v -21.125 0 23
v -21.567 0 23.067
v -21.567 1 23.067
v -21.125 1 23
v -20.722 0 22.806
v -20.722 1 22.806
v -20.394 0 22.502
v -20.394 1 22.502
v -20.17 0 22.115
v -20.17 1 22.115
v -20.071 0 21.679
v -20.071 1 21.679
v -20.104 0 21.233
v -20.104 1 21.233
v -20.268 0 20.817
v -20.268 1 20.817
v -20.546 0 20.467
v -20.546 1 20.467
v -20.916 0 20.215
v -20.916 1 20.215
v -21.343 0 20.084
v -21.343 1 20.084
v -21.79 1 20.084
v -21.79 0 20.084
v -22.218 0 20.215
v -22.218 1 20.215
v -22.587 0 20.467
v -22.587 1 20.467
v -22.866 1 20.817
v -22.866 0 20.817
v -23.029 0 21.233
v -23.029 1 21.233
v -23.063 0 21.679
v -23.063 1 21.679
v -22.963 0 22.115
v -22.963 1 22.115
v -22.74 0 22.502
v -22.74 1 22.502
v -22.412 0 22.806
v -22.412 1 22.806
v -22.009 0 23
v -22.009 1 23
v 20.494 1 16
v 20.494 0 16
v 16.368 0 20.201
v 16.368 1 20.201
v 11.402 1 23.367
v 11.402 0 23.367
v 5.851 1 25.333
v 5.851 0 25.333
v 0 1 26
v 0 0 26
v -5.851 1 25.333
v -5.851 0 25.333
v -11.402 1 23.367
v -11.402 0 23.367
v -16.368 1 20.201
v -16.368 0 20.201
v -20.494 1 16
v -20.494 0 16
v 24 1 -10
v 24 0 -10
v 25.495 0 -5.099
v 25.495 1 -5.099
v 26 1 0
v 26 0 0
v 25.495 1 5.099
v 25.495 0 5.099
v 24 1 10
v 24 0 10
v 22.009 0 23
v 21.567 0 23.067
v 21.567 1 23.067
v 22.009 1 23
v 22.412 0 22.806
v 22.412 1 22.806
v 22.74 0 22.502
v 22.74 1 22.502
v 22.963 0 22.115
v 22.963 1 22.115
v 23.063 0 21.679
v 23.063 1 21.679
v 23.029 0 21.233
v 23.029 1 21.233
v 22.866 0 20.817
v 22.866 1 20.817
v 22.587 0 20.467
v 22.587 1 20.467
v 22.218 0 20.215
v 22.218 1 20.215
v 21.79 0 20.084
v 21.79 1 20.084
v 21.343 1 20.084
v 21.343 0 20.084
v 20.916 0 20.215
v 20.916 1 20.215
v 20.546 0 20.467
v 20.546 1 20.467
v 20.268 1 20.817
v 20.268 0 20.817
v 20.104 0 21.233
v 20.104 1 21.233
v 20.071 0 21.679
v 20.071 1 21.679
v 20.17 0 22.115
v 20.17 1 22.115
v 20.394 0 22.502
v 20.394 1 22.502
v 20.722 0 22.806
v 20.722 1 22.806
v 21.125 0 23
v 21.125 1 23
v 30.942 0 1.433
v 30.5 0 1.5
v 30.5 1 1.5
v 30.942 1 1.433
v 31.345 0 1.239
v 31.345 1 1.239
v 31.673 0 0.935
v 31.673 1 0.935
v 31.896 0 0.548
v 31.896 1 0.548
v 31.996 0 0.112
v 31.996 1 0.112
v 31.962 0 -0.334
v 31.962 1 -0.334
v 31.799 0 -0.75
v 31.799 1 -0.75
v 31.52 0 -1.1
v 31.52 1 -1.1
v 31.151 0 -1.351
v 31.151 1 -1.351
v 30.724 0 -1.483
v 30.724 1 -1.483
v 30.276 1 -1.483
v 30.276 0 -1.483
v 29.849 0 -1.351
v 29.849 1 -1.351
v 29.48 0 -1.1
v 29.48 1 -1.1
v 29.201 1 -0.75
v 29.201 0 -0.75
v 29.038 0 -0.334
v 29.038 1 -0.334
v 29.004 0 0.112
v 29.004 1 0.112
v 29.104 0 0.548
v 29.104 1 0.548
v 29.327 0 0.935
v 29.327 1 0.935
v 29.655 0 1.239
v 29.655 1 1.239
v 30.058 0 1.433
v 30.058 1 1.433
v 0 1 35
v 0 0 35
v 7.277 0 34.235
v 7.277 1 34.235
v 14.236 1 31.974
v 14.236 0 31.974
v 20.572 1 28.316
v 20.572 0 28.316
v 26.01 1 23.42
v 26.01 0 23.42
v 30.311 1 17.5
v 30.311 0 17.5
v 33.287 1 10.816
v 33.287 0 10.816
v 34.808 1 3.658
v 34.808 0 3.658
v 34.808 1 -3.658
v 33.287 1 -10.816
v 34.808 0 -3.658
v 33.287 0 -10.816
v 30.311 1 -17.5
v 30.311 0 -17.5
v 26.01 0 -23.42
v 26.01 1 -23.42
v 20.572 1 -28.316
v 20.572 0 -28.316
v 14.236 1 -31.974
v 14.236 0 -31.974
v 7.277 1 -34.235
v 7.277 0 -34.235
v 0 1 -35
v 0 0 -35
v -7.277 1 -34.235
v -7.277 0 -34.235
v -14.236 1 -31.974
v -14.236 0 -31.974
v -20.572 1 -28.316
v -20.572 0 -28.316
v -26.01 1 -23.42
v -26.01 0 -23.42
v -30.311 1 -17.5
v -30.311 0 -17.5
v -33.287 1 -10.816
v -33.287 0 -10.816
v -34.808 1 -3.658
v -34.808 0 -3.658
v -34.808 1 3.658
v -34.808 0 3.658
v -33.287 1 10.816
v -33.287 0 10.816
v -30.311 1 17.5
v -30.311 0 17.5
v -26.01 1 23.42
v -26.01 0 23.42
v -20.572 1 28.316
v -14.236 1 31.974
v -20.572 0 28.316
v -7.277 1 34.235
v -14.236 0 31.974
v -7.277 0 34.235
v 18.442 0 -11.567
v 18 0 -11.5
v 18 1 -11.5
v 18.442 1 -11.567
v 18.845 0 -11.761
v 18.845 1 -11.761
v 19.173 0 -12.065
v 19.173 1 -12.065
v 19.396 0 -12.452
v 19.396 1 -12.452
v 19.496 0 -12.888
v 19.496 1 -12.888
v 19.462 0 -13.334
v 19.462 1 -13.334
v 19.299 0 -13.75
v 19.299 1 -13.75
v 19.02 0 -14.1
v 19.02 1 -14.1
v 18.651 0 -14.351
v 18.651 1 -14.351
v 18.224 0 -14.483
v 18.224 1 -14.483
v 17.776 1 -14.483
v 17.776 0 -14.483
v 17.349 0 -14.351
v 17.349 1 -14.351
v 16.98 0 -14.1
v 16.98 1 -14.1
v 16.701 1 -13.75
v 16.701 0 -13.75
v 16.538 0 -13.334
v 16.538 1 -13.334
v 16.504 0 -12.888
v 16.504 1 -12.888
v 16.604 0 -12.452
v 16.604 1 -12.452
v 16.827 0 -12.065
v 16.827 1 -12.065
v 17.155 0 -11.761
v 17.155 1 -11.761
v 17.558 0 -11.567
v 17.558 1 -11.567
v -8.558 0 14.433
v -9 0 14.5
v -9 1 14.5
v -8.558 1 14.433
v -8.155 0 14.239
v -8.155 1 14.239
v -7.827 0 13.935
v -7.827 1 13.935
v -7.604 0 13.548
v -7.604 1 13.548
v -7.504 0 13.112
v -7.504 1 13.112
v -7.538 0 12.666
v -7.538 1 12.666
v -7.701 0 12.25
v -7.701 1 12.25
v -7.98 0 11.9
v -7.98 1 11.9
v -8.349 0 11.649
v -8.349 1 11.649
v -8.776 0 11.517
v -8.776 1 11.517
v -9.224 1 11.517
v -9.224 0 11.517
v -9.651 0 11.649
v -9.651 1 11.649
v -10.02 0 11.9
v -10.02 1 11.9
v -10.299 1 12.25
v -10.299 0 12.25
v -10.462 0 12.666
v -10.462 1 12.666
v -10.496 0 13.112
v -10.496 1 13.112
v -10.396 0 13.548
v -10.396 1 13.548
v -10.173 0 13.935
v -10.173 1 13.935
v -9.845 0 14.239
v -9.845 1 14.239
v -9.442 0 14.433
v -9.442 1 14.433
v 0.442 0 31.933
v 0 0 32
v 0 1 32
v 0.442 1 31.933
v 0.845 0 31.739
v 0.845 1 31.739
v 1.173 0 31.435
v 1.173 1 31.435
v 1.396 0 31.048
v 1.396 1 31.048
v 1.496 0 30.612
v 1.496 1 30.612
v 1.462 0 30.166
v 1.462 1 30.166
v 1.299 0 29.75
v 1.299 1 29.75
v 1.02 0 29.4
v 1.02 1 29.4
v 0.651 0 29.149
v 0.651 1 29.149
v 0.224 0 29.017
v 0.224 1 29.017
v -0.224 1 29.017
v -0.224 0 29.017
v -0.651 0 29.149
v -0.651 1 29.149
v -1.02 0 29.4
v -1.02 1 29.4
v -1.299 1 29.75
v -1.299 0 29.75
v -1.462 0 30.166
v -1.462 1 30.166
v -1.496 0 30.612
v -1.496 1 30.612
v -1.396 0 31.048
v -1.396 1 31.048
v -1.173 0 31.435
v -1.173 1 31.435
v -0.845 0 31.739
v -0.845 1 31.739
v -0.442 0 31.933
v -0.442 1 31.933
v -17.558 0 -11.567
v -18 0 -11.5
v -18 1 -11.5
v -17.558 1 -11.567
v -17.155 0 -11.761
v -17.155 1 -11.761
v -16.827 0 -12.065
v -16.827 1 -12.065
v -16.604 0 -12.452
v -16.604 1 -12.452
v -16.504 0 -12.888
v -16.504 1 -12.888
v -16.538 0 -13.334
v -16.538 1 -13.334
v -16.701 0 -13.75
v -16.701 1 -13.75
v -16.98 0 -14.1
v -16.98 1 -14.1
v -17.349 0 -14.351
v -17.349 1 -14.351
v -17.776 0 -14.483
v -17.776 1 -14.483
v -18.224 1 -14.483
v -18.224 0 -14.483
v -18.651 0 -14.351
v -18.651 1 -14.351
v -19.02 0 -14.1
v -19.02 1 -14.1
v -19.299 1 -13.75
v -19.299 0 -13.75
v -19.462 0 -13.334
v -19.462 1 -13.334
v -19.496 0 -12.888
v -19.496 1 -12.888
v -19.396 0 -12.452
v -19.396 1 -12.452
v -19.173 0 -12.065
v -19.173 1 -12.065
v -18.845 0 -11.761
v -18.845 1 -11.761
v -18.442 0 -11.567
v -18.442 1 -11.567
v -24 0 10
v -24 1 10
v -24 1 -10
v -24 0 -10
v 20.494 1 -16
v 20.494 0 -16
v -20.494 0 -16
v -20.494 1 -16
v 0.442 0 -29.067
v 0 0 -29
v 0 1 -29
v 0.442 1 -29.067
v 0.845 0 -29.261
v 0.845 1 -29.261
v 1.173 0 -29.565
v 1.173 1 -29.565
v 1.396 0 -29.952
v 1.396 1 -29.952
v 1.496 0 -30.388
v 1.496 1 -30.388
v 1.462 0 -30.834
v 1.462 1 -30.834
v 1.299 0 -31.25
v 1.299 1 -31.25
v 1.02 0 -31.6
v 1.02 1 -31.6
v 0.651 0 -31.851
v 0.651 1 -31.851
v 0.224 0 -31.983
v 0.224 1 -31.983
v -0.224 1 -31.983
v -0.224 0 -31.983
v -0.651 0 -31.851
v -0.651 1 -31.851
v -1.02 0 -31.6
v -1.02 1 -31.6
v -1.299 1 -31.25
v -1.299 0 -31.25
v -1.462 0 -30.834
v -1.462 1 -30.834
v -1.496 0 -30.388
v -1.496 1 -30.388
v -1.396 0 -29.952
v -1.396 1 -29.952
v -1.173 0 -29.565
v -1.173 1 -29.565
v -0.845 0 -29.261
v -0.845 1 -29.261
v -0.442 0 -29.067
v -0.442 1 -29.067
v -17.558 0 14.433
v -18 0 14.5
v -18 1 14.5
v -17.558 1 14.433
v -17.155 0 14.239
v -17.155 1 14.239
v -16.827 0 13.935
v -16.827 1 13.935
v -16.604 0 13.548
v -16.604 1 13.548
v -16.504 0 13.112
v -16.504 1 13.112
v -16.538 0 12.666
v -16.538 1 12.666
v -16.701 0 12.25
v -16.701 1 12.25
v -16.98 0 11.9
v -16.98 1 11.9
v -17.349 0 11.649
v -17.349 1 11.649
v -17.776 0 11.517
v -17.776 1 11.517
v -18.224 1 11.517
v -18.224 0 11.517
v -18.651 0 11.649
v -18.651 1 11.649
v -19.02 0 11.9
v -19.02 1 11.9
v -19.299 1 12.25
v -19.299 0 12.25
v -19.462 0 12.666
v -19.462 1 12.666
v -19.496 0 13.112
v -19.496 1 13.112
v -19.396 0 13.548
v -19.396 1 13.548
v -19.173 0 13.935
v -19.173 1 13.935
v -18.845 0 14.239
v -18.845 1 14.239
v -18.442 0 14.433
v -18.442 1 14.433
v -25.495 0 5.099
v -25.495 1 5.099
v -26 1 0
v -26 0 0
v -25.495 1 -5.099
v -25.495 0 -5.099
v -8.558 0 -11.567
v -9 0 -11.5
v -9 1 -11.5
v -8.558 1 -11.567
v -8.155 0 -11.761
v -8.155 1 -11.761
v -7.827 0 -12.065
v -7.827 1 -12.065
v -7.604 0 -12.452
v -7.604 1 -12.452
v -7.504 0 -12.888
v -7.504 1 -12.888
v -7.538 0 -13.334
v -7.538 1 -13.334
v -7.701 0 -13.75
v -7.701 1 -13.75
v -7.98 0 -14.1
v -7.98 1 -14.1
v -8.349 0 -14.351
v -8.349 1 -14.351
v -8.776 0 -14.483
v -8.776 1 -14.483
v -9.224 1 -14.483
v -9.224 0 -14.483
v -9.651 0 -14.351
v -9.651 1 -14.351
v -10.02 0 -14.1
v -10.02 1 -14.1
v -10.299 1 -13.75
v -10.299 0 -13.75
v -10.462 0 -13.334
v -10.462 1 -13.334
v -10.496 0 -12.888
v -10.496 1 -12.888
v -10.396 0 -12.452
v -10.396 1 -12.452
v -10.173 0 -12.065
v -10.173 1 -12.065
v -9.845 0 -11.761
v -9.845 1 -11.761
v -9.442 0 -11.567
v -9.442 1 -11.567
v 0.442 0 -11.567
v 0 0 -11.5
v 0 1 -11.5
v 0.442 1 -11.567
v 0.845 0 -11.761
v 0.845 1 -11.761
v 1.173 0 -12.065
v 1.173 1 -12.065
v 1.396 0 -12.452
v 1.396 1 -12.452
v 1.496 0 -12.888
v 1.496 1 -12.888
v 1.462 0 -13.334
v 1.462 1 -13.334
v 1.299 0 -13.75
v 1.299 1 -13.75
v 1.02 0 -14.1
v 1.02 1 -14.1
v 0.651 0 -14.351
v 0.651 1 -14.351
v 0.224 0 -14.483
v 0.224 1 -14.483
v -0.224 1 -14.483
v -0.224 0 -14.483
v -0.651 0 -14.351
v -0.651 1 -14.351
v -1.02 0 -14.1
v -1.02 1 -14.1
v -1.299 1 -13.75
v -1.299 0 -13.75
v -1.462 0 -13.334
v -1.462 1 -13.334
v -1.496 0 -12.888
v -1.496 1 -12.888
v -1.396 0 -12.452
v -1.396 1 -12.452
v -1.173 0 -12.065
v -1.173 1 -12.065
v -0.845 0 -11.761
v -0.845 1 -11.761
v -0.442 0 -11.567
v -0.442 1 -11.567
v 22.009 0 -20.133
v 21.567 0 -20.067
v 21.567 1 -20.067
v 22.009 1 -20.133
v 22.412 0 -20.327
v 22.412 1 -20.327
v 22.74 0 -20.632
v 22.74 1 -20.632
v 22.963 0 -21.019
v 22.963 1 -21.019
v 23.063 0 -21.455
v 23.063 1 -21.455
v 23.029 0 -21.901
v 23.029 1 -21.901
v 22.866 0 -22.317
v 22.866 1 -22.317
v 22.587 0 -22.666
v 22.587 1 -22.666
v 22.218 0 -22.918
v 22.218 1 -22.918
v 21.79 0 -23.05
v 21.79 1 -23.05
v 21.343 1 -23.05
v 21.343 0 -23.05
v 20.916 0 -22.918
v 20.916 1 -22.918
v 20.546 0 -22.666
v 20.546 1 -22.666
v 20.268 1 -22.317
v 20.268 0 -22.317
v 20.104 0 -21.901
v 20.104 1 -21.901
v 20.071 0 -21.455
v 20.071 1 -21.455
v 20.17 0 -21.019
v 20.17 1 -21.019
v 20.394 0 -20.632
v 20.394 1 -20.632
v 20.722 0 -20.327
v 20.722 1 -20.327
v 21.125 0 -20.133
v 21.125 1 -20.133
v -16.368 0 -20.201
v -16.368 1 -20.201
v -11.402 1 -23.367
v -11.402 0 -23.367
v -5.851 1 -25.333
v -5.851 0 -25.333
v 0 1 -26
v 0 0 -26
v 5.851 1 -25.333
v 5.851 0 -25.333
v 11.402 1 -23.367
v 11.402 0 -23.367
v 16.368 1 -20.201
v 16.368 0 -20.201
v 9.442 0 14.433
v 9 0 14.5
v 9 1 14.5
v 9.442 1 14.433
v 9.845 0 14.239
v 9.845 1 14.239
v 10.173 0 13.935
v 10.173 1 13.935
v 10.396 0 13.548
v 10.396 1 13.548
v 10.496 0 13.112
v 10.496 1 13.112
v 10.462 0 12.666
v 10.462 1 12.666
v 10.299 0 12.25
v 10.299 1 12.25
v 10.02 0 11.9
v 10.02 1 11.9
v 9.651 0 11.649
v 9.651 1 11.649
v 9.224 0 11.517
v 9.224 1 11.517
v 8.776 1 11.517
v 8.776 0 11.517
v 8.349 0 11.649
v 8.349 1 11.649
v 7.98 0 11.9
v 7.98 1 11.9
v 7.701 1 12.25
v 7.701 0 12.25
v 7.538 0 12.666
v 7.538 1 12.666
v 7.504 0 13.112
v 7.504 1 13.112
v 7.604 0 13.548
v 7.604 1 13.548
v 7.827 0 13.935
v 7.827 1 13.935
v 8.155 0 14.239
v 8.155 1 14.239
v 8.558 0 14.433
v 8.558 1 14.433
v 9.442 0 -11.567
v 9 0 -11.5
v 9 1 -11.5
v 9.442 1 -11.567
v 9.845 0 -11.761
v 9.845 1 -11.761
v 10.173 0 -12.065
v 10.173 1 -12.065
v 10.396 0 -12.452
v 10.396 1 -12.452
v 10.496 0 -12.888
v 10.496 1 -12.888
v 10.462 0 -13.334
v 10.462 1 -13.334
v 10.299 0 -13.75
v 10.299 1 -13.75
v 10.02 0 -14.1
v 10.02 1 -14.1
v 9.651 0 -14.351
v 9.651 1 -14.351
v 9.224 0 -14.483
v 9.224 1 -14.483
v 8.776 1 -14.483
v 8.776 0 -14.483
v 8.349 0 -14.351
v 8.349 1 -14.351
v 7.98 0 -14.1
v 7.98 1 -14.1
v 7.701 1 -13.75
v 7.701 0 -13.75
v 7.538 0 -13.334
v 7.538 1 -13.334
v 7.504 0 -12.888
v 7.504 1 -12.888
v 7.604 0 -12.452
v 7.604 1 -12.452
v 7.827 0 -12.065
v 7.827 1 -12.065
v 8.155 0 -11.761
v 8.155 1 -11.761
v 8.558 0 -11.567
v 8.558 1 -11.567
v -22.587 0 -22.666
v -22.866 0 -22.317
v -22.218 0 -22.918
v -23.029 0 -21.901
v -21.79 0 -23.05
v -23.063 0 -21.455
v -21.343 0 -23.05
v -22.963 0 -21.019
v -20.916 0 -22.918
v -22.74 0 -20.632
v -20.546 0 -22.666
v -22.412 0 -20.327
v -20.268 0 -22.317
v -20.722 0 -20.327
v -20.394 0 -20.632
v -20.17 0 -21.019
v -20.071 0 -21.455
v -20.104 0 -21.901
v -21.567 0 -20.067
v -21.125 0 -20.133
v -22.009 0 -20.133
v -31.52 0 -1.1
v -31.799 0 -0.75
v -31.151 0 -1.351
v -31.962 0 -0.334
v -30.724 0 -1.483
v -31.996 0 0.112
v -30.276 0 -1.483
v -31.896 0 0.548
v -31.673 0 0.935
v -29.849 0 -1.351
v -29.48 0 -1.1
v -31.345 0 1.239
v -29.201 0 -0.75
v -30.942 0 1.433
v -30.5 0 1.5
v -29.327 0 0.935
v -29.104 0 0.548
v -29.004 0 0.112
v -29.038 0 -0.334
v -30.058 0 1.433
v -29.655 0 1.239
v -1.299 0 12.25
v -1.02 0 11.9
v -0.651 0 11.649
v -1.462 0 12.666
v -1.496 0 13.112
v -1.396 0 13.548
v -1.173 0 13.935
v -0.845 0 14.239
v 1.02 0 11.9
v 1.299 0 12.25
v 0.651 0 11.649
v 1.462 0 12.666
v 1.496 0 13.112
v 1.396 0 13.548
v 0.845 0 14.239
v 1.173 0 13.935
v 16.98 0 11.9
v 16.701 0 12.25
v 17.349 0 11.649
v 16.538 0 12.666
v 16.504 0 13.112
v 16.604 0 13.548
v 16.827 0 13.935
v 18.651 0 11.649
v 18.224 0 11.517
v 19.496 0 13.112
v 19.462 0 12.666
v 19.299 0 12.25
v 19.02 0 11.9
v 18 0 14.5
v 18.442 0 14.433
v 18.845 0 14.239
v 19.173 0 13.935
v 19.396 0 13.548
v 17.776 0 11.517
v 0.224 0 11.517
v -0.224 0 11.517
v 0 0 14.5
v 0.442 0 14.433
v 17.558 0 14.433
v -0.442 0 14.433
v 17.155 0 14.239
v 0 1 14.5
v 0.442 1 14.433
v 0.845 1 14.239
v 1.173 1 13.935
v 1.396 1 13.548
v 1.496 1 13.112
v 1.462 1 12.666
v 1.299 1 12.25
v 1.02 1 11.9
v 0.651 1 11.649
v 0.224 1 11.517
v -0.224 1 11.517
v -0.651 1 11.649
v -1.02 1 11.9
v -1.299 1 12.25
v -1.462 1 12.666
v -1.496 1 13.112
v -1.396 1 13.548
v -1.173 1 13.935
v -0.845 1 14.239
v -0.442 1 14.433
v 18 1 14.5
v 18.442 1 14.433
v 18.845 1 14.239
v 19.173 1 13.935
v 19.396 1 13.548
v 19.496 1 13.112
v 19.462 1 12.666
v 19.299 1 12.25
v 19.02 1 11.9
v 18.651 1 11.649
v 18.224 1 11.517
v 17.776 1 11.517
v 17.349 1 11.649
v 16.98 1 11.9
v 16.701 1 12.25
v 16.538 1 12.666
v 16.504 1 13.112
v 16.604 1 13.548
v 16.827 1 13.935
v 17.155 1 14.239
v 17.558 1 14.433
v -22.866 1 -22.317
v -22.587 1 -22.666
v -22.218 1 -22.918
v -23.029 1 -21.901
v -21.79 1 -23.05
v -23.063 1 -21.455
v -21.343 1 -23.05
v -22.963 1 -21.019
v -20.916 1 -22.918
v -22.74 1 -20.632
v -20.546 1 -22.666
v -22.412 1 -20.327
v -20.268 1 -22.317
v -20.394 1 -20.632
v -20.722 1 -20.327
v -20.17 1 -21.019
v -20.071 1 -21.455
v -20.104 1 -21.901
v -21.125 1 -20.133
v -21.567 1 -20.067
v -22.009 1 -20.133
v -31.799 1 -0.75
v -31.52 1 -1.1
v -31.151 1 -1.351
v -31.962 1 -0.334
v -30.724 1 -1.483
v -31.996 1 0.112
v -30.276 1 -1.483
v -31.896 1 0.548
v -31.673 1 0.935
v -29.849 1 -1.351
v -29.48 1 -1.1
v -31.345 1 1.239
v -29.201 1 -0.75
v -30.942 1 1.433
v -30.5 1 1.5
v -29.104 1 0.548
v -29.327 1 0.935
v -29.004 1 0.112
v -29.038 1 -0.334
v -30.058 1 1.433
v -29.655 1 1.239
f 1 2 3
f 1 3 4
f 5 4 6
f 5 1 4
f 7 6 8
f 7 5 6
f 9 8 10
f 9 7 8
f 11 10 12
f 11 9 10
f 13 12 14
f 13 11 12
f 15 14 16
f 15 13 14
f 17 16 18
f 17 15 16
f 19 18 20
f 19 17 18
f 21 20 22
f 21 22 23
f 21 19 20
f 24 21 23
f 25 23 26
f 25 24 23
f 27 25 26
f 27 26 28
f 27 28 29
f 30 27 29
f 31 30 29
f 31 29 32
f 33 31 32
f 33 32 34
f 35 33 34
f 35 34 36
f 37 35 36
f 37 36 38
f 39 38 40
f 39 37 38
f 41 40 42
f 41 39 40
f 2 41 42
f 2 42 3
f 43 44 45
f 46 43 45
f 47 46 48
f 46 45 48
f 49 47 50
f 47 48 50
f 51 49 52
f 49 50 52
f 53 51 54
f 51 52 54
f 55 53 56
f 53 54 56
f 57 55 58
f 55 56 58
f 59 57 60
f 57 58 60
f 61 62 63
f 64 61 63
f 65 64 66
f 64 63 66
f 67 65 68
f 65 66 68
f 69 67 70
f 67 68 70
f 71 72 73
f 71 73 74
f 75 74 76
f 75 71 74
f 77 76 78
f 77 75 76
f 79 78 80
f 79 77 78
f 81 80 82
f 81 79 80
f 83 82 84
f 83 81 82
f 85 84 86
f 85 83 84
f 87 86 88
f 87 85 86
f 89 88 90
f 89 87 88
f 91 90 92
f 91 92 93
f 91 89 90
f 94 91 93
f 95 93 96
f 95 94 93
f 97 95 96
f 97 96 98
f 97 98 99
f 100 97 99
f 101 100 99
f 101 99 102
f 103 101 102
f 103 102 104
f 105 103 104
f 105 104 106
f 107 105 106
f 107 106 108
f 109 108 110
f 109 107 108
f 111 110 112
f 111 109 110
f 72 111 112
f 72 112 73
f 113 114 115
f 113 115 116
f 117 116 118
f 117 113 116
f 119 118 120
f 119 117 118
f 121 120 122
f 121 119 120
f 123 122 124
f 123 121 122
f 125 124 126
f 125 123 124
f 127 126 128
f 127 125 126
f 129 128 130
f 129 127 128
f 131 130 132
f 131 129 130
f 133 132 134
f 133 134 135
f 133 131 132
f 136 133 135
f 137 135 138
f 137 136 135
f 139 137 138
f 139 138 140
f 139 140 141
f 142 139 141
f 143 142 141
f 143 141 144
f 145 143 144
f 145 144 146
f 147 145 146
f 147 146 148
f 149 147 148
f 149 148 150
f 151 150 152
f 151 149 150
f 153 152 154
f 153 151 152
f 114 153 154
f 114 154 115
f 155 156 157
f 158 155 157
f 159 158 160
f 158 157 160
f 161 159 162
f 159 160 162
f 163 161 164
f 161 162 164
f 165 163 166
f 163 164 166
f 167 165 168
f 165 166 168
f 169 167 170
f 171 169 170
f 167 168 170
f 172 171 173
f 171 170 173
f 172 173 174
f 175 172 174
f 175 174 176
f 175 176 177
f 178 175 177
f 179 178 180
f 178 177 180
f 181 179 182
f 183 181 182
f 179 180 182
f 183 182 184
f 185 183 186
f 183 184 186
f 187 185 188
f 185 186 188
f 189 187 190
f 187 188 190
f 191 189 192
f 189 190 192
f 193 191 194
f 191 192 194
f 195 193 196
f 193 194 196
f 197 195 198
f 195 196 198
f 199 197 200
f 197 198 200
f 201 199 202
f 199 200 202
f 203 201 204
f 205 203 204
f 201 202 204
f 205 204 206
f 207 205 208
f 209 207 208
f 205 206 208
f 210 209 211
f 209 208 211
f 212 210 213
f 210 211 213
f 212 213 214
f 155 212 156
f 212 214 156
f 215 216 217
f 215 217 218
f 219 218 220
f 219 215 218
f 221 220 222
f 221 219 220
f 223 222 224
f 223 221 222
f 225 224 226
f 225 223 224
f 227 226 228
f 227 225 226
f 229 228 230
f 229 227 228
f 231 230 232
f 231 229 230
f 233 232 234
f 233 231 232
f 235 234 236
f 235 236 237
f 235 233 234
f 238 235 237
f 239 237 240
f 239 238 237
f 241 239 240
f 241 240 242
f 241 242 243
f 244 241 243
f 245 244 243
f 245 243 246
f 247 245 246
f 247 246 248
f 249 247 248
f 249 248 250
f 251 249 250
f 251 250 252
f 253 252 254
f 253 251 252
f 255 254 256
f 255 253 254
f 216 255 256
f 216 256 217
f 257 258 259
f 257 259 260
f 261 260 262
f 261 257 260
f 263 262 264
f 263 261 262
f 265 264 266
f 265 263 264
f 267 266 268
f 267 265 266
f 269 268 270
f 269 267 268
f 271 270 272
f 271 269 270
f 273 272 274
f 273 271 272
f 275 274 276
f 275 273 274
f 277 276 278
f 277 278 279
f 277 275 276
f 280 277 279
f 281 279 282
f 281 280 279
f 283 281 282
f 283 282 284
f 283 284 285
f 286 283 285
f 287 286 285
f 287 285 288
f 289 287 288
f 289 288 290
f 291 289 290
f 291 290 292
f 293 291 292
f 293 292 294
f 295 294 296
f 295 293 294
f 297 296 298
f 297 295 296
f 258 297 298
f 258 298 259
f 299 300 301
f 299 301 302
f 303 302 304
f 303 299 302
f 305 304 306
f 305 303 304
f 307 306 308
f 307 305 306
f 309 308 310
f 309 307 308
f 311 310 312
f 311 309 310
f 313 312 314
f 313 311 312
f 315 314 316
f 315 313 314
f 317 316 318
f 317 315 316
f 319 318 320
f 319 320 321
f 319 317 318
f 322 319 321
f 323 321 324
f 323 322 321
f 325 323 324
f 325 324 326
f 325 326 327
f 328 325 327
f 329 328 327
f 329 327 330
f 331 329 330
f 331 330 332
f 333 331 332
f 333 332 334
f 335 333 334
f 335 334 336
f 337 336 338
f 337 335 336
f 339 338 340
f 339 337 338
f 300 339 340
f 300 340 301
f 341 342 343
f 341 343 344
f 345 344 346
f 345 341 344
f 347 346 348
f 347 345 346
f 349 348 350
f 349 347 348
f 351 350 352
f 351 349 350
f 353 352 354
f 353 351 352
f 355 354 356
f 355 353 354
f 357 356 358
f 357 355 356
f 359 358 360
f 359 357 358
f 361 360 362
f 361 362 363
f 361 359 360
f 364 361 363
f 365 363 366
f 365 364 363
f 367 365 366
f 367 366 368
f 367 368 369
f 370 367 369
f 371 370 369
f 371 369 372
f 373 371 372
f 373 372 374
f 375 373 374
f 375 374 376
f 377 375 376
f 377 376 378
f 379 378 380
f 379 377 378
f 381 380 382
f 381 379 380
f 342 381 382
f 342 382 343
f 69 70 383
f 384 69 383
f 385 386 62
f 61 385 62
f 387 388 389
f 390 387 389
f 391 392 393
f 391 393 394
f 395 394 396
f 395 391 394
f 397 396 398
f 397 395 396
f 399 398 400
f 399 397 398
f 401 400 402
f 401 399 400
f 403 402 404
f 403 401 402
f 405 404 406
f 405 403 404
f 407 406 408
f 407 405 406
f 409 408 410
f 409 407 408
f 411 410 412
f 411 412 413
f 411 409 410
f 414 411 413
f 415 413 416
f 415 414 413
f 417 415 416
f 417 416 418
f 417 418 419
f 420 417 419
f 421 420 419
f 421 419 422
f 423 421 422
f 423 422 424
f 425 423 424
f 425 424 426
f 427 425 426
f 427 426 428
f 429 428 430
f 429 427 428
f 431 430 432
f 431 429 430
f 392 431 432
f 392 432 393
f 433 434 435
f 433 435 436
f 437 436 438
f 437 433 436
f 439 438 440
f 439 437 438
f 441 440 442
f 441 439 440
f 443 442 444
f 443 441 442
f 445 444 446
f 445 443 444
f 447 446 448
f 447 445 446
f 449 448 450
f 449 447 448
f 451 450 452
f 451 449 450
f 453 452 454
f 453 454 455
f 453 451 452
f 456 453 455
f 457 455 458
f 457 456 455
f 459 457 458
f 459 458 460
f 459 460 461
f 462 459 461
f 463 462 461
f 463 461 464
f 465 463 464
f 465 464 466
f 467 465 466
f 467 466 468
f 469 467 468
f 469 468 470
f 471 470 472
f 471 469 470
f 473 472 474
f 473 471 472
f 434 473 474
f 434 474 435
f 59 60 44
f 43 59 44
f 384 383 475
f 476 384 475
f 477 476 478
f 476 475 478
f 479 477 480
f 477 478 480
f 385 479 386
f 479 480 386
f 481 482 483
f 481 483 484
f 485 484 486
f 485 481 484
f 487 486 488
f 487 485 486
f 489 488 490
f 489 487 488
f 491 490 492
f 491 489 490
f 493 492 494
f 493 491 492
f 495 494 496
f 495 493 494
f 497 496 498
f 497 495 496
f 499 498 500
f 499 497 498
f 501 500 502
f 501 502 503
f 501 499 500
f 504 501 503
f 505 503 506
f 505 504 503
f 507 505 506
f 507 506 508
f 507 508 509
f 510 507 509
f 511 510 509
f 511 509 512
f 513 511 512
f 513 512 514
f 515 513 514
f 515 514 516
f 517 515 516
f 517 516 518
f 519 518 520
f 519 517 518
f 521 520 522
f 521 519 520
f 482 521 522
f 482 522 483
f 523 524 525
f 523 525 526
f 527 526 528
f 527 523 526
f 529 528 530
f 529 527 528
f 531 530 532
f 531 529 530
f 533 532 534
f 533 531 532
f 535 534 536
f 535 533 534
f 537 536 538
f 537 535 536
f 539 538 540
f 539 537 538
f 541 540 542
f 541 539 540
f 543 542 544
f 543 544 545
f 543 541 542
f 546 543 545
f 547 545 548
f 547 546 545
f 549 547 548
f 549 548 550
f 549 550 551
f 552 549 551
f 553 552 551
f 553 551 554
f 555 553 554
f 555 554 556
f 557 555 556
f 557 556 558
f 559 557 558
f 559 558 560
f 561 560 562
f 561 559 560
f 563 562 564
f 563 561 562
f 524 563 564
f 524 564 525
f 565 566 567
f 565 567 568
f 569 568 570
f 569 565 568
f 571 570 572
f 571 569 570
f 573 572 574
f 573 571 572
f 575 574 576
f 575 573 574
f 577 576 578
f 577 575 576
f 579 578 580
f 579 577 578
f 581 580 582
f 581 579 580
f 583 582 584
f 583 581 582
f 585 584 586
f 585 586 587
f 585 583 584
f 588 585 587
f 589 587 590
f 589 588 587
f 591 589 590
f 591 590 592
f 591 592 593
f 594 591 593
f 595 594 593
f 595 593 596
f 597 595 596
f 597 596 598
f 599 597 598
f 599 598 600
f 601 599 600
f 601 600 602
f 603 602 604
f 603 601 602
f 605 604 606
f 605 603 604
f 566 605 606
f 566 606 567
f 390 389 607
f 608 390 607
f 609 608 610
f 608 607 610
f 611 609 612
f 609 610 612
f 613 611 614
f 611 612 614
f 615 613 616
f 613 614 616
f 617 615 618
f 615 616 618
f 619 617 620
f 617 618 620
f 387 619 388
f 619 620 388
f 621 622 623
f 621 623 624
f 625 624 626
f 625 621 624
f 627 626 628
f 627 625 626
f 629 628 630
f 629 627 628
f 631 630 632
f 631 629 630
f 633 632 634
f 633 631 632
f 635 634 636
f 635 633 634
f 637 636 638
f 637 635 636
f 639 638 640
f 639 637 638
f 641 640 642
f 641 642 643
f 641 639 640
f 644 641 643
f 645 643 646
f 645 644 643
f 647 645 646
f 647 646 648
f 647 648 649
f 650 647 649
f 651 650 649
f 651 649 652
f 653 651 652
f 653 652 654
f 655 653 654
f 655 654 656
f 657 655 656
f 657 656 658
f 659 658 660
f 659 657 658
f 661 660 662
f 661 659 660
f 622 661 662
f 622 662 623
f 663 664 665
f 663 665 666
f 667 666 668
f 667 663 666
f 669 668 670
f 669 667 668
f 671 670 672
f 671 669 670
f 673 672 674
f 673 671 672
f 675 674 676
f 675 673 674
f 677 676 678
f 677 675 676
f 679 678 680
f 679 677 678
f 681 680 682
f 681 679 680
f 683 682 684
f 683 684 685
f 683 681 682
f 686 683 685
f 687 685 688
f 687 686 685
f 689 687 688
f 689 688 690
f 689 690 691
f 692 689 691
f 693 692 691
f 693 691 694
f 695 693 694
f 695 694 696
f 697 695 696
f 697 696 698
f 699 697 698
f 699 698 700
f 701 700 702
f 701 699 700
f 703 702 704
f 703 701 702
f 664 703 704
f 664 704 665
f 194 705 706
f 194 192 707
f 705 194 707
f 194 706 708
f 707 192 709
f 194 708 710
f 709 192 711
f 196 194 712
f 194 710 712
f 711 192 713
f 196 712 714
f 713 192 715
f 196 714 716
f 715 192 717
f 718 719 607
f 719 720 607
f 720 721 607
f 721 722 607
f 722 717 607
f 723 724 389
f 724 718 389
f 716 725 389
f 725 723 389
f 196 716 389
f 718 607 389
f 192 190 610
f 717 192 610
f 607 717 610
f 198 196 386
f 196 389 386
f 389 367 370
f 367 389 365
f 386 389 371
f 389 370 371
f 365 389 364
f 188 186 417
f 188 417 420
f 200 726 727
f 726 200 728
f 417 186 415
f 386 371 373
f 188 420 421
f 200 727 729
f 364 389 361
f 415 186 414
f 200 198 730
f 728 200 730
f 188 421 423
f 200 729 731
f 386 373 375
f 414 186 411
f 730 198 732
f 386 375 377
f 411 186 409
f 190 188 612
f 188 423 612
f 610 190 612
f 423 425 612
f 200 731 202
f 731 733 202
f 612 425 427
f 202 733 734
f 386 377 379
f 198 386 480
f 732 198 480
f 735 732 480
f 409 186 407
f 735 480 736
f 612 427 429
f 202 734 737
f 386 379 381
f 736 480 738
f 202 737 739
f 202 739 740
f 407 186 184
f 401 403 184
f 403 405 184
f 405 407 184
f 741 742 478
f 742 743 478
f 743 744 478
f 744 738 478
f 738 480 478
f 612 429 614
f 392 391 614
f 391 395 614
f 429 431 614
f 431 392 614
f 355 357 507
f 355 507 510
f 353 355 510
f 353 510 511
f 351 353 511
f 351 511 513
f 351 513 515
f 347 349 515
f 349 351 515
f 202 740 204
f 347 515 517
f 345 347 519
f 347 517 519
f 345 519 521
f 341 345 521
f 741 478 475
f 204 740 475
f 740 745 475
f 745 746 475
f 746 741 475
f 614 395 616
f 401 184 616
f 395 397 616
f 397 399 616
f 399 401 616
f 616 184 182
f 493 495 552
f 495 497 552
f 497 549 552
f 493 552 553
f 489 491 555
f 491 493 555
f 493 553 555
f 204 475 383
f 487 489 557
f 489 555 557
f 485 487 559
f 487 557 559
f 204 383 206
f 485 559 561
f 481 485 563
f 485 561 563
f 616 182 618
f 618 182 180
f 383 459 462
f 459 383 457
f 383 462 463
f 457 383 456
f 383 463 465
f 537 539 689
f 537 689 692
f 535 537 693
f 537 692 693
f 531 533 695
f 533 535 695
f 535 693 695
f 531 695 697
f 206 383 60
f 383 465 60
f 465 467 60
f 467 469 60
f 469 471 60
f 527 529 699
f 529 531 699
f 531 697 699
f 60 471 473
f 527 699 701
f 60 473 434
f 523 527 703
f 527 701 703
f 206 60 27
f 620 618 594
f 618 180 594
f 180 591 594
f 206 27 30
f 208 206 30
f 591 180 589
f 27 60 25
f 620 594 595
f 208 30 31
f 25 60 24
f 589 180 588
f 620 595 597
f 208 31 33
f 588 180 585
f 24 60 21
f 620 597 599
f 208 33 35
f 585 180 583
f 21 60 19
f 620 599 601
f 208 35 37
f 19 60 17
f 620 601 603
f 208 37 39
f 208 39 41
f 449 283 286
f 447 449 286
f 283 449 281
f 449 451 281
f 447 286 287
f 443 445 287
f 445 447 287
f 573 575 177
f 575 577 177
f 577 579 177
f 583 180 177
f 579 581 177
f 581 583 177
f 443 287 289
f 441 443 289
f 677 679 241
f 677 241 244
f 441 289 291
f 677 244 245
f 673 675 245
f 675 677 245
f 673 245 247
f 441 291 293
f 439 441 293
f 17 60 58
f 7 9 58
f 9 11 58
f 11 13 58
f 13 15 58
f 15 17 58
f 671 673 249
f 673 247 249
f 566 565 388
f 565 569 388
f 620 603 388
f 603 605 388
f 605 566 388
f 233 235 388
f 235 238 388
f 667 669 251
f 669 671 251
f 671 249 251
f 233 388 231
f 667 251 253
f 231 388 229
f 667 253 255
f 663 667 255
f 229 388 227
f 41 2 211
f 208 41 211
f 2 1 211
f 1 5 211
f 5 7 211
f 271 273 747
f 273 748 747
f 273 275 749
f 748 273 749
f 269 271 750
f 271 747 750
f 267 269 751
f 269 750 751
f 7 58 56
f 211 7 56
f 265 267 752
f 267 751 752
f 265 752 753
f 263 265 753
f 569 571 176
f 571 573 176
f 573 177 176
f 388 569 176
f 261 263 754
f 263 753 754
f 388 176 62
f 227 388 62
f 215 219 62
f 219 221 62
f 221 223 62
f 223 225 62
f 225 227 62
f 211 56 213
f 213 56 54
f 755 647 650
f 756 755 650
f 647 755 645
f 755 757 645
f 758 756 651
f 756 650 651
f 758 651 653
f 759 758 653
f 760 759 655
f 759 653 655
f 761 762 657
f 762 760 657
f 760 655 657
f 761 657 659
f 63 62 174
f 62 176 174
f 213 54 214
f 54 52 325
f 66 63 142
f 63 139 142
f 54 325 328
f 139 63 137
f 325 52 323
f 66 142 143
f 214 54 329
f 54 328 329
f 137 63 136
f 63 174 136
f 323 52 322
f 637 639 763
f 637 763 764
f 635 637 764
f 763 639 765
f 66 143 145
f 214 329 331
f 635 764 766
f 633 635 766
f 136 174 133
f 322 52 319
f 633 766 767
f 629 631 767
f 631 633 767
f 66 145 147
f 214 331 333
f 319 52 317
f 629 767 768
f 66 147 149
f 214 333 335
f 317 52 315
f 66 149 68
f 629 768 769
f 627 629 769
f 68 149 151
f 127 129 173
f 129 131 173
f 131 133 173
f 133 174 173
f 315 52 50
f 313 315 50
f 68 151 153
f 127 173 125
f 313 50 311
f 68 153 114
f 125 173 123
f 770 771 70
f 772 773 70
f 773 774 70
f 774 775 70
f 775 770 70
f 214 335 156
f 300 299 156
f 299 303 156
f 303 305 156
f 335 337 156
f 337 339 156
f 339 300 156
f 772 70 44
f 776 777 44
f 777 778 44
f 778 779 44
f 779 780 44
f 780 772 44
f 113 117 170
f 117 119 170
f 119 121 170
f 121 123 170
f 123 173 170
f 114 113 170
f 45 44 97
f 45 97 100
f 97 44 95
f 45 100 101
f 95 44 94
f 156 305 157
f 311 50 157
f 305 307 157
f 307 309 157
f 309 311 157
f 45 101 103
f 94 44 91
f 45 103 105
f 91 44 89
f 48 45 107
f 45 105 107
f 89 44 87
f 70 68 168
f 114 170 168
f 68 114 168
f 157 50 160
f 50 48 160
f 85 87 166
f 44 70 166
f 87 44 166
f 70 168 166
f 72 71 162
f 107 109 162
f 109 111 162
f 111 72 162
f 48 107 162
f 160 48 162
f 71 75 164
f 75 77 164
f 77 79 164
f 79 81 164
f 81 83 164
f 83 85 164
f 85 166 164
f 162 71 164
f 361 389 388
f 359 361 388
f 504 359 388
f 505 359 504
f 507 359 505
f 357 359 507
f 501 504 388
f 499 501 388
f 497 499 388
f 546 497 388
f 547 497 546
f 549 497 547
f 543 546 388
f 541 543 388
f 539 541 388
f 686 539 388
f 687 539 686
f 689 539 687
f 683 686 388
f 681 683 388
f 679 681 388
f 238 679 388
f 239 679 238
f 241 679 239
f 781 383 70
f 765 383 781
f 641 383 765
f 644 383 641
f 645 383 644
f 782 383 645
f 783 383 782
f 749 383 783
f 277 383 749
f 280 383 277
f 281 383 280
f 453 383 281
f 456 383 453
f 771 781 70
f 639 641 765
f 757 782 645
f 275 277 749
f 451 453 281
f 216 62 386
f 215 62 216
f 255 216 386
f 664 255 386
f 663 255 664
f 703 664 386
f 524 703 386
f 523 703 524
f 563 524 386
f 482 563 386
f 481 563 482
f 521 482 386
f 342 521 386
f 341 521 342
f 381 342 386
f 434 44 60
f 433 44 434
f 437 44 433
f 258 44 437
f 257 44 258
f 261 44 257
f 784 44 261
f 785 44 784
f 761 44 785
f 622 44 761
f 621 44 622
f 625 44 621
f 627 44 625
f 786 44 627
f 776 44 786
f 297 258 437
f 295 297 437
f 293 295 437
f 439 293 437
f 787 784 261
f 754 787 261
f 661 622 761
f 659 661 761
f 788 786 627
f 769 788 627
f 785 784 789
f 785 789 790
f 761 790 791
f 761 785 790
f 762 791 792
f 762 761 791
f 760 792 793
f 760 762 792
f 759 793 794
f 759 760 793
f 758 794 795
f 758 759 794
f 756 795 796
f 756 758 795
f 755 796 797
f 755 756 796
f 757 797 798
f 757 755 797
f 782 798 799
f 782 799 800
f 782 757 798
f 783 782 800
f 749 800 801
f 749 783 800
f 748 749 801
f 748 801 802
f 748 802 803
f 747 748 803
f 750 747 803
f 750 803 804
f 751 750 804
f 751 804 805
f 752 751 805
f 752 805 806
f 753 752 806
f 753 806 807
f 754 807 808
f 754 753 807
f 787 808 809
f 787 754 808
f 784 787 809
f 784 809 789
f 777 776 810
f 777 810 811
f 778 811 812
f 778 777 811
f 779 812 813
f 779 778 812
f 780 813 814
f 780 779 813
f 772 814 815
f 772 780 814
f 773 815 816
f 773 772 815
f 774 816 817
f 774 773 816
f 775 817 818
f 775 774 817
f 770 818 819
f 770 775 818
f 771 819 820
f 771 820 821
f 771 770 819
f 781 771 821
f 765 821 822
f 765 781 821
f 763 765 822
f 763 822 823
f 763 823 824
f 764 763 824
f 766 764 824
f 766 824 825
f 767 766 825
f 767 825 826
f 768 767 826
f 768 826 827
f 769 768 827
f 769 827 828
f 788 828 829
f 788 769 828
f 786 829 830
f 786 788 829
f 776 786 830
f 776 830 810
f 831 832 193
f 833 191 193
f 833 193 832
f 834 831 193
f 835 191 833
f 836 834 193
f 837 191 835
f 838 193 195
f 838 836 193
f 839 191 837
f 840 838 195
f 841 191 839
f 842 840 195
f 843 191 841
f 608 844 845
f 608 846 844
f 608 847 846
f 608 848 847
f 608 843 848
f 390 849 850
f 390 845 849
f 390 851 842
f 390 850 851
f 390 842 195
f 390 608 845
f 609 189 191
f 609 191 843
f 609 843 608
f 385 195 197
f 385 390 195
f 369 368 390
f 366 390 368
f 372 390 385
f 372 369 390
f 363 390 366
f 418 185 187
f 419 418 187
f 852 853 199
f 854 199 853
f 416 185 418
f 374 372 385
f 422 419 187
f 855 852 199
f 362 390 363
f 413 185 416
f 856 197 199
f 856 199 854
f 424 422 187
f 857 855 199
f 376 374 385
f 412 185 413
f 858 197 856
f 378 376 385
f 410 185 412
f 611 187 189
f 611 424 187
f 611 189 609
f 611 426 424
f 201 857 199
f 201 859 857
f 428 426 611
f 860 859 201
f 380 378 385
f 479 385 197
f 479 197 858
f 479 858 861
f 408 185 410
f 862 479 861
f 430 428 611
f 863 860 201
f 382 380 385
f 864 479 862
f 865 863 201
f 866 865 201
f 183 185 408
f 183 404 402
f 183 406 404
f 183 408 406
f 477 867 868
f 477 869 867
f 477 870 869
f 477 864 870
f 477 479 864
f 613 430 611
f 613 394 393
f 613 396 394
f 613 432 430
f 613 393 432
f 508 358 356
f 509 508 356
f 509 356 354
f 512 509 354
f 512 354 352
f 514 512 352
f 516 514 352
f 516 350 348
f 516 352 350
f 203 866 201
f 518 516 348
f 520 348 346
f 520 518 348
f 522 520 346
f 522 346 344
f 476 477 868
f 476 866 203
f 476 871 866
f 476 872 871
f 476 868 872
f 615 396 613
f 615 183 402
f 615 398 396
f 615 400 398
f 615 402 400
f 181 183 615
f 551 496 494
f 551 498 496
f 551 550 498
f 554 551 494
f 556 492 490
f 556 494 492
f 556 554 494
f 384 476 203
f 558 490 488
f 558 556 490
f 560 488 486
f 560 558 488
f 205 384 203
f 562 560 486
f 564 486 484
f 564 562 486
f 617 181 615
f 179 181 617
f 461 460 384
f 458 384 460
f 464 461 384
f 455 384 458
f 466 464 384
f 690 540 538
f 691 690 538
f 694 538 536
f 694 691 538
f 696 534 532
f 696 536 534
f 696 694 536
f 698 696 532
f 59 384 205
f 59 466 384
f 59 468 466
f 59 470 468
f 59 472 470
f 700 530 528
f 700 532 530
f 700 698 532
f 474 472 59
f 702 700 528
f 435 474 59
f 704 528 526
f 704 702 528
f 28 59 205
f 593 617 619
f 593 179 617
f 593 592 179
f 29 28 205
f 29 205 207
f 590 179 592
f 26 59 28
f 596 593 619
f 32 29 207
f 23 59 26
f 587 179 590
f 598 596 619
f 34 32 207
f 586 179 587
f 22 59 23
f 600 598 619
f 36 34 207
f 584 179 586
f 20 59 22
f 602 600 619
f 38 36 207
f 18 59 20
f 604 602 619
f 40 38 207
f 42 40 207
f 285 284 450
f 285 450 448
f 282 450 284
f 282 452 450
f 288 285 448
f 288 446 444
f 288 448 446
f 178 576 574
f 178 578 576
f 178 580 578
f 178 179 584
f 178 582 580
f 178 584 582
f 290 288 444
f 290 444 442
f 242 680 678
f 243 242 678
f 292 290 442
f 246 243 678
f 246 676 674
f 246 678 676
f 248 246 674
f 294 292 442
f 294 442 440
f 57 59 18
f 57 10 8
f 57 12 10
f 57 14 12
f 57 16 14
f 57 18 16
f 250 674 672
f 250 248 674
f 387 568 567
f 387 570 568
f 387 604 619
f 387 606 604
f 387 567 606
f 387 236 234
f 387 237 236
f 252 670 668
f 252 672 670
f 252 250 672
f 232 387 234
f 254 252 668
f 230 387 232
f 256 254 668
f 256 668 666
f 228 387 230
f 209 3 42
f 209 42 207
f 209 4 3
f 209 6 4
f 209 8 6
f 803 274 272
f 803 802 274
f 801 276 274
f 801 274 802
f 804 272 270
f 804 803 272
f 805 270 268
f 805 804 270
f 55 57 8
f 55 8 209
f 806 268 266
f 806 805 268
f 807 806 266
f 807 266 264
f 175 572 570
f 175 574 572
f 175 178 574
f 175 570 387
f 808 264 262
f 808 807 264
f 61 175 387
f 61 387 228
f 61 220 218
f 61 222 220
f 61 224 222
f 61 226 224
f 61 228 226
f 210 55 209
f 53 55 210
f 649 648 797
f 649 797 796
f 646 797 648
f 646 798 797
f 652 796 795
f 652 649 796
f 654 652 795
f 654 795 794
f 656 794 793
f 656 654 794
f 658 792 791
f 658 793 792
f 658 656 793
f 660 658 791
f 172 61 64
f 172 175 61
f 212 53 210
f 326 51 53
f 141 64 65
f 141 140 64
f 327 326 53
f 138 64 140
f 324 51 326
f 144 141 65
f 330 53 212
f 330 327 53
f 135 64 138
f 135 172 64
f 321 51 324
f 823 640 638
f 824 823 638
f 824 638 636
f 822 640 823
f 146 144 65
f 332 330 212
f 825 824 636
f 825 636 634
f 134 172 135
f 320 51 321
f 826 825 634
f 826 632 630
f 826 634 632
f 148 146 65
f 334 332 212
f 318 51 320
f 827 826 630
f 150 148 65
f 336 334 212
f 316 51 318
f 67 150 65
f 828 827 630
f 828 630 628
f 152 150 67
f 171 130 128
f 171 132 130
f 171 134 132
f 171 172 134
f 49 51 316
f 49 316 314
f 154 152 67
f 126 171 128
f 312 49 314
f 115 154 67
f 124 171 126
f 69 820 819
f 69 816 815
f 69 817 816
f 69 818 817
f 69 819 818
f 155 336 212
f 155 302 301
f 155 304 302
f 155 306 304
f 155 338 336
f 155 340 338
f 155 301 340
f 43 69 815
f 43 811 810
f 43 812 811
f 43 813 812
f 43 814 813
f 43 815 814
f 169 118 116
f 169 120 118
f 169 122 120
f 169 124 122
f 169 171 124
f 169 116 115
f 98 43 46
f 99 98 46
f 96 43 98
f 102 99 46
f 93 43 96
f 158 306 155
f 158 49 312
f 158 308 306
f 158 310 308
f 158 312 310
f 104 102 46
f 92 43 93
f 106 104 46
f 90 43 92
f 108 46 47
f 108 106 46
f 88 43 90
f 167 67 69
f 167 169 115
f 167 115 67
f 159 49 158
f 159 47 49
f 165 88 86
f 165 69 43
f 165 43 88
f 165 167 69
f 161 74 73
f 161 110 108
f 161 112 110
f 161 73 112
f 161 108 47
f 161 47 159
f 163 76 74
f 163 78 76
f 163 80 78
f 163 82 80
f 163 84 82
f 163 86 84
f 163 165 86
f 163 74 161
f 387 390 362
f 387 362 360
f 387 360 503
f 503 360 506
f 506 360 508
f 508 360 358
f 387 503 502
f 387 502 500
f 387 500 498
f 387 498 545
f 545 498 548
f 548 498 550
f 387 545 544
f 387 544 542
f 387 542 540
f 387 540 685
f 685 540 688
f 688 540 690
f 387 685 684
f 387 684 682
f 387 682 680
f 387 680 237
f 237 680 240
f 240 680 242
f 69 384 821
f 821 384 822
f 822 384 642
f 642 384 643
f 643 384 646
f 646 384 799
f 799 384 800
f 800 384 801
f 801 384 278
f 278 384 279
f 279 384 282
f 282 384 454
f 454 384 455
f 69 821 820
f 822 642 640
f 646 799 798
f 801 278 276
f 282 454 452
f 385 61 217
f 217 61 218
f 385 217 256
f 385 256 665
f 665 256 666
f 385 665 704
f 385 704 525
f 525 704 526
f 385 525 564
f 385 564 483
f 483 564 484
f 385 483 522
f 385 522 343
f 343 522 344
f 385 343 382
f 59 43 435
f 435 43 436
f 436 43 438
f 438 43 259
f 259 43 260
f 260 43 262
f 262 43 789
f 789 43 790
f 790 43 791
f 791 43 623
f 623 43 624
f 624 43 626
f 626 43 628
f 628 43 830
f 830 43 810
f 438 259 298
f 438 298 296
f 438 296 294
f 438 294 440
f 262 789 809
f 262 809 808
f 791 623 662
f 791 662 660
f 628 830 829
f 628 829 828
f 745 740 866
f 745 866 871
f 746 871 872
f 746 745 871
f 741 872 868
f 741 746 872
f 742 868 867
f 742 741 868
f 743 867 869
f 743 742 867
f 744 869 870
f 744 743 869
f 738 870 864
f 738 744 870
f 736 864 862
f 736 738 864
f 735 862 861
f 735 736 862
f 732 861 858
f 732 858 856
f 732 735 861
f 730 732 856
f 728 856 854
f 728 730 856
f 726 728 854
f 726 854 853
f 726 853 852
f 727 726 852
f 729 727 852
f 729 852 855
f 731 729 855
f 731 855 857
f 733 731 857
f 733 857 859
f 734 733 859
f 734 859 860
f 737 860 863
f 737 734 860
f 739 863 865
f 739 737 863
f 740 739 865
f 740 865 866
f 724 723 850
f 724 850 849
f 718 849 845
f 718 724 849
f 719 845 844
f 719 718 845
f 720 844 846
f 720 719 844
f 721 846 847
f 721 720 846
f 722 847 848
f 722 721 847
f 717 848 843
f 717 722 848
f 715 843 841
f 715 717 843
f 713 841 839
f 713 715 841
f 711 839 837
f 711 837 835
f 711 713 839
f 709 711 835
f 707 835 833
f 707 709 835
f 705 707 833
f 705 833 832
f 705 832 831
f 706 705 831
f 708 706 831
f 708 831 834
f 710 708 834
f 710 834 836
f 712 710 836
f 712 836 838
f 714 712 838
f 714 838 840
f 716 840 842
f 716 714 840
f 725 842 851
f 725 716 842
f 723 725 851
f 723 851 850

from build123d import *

# Parameters (mm, degrees)
SKETCH_1_R      = 35
SKETCH_1_R_2    = 1.5
EXTRUDE_1_DEPTH = 1


with BuildPart() as part:
    # Эскиз1 → Бобышка-Вытянуть1 (new body)
    with BuildSketch(Plane(origin=(0, 0, 0), x_dir=(1, 0, 0), z_dir=(0, 1, 0))):
        Circle(SKETCH_1_R)
        with BuildLine():
            Line((24, -10), (-18, -10))
            Line((-18, -10), (-24, -10))
            ThreePointArc((-24, -10), (-26, 0), (-24, 10))
            Line((-24, 10), (-18, 10))
            Line((-18, 10), (24, 10))
            ThreePointArc((24, 10), (26, 0), (24, -10))
        make_face(mode=Mode.SUBTRACT)
        with BuildLine():
            Line((-20.493901532, -16), (20.493901532, -16))
            ThreePointArc((20.493901532, -16), (0, -26), (-20.493901532, -16))
        make_face(mode=Mode.SUBTRACT)
        with Locations((-18, -13)):
            Circle(SKETCH_1_R_2, mode=Mode.SUBTRACT)
        with Locations((-9, -13)):
            Circle(SKETCH_1_R_2, mode=Mode.SUBTRACT)
        with Locations((0, -13)):
            Circle(SKETCH_1_R_2, mode=Mode.SUBTRACT)
        with Locations((9, -13)):
            Circle(SKETCH_1_R_2, mode=Mode.SUBTRACT)
        with Locations((18, -13)):
            Circle(SKETCH_1_R_2, mode=Mode.SUBTRACT)
        with Locations((-21.566756826, -21.566756826)):
            Circle(SKETCH_1_R_2, mode=Mode.SUBTRACT)
        with Locations((-30.5, 0)):
            Circle(SKETCH_1_R_2, mode=Mode.SUBTRACT)
        with Locations((0, -30.5)):
            Circle(SKETCH_1_R_2, mode=Mode.SUBTRACT)
        with Locations((21.566756826, -21.566756826)):
            Circle(SKETCH_1_R_2, mode=Mode.SUBTRACT)
        with Locations((-21.566756826, 21.566756826)):
            Circle(SKETCH_1_R_2, mode=Mode.SUBTRACT)
        with BuildLine():
            ThreePointArc((-20.493901532, 16), (0, 26), (20.493901532, 16))
            Line((20.493901532, 16), (-20.493901532, 16))
        make_face(mode=Mode.SUBTRACT)
        with Locations((0, 30.5)):
            Circle(SKETCH_1_R_2, mode=Mode.SUBTRACT)
        with Locations((21.566756826, 21.566756826)):
            Circle(SKETCH_1_R_2, mode=Mode.SUBTRACT)
        with Locations((30.5, 0)):
            Circle(SKETCH_1_R_2, mode=Mode.SUBTRACT)
        with Locations((18, 13)):
            Circle(SKETCH_1_R_2, mode=Mode.SUBTRACT)
        with Locations((-18, 13)):
            Circle(SKETCH_1_R_2, mode=Mode.SUBTRACT)
        with Locations((-9, 13)):
            Circle(SKETCH_1_R_2, mode=Mode.SUBTRACT)
        with Locations((0, 13)):
            Circle(SKETCH_1_R_2, mode=Mode.SUBTRACT)
        with Locations((9, 13)):
            Circle(SKETCH_1_R_2, mode=Mode.SUBTRACT)
    extrude(amount=EXTRUDE_1_DEPTH)


solid = part.part
